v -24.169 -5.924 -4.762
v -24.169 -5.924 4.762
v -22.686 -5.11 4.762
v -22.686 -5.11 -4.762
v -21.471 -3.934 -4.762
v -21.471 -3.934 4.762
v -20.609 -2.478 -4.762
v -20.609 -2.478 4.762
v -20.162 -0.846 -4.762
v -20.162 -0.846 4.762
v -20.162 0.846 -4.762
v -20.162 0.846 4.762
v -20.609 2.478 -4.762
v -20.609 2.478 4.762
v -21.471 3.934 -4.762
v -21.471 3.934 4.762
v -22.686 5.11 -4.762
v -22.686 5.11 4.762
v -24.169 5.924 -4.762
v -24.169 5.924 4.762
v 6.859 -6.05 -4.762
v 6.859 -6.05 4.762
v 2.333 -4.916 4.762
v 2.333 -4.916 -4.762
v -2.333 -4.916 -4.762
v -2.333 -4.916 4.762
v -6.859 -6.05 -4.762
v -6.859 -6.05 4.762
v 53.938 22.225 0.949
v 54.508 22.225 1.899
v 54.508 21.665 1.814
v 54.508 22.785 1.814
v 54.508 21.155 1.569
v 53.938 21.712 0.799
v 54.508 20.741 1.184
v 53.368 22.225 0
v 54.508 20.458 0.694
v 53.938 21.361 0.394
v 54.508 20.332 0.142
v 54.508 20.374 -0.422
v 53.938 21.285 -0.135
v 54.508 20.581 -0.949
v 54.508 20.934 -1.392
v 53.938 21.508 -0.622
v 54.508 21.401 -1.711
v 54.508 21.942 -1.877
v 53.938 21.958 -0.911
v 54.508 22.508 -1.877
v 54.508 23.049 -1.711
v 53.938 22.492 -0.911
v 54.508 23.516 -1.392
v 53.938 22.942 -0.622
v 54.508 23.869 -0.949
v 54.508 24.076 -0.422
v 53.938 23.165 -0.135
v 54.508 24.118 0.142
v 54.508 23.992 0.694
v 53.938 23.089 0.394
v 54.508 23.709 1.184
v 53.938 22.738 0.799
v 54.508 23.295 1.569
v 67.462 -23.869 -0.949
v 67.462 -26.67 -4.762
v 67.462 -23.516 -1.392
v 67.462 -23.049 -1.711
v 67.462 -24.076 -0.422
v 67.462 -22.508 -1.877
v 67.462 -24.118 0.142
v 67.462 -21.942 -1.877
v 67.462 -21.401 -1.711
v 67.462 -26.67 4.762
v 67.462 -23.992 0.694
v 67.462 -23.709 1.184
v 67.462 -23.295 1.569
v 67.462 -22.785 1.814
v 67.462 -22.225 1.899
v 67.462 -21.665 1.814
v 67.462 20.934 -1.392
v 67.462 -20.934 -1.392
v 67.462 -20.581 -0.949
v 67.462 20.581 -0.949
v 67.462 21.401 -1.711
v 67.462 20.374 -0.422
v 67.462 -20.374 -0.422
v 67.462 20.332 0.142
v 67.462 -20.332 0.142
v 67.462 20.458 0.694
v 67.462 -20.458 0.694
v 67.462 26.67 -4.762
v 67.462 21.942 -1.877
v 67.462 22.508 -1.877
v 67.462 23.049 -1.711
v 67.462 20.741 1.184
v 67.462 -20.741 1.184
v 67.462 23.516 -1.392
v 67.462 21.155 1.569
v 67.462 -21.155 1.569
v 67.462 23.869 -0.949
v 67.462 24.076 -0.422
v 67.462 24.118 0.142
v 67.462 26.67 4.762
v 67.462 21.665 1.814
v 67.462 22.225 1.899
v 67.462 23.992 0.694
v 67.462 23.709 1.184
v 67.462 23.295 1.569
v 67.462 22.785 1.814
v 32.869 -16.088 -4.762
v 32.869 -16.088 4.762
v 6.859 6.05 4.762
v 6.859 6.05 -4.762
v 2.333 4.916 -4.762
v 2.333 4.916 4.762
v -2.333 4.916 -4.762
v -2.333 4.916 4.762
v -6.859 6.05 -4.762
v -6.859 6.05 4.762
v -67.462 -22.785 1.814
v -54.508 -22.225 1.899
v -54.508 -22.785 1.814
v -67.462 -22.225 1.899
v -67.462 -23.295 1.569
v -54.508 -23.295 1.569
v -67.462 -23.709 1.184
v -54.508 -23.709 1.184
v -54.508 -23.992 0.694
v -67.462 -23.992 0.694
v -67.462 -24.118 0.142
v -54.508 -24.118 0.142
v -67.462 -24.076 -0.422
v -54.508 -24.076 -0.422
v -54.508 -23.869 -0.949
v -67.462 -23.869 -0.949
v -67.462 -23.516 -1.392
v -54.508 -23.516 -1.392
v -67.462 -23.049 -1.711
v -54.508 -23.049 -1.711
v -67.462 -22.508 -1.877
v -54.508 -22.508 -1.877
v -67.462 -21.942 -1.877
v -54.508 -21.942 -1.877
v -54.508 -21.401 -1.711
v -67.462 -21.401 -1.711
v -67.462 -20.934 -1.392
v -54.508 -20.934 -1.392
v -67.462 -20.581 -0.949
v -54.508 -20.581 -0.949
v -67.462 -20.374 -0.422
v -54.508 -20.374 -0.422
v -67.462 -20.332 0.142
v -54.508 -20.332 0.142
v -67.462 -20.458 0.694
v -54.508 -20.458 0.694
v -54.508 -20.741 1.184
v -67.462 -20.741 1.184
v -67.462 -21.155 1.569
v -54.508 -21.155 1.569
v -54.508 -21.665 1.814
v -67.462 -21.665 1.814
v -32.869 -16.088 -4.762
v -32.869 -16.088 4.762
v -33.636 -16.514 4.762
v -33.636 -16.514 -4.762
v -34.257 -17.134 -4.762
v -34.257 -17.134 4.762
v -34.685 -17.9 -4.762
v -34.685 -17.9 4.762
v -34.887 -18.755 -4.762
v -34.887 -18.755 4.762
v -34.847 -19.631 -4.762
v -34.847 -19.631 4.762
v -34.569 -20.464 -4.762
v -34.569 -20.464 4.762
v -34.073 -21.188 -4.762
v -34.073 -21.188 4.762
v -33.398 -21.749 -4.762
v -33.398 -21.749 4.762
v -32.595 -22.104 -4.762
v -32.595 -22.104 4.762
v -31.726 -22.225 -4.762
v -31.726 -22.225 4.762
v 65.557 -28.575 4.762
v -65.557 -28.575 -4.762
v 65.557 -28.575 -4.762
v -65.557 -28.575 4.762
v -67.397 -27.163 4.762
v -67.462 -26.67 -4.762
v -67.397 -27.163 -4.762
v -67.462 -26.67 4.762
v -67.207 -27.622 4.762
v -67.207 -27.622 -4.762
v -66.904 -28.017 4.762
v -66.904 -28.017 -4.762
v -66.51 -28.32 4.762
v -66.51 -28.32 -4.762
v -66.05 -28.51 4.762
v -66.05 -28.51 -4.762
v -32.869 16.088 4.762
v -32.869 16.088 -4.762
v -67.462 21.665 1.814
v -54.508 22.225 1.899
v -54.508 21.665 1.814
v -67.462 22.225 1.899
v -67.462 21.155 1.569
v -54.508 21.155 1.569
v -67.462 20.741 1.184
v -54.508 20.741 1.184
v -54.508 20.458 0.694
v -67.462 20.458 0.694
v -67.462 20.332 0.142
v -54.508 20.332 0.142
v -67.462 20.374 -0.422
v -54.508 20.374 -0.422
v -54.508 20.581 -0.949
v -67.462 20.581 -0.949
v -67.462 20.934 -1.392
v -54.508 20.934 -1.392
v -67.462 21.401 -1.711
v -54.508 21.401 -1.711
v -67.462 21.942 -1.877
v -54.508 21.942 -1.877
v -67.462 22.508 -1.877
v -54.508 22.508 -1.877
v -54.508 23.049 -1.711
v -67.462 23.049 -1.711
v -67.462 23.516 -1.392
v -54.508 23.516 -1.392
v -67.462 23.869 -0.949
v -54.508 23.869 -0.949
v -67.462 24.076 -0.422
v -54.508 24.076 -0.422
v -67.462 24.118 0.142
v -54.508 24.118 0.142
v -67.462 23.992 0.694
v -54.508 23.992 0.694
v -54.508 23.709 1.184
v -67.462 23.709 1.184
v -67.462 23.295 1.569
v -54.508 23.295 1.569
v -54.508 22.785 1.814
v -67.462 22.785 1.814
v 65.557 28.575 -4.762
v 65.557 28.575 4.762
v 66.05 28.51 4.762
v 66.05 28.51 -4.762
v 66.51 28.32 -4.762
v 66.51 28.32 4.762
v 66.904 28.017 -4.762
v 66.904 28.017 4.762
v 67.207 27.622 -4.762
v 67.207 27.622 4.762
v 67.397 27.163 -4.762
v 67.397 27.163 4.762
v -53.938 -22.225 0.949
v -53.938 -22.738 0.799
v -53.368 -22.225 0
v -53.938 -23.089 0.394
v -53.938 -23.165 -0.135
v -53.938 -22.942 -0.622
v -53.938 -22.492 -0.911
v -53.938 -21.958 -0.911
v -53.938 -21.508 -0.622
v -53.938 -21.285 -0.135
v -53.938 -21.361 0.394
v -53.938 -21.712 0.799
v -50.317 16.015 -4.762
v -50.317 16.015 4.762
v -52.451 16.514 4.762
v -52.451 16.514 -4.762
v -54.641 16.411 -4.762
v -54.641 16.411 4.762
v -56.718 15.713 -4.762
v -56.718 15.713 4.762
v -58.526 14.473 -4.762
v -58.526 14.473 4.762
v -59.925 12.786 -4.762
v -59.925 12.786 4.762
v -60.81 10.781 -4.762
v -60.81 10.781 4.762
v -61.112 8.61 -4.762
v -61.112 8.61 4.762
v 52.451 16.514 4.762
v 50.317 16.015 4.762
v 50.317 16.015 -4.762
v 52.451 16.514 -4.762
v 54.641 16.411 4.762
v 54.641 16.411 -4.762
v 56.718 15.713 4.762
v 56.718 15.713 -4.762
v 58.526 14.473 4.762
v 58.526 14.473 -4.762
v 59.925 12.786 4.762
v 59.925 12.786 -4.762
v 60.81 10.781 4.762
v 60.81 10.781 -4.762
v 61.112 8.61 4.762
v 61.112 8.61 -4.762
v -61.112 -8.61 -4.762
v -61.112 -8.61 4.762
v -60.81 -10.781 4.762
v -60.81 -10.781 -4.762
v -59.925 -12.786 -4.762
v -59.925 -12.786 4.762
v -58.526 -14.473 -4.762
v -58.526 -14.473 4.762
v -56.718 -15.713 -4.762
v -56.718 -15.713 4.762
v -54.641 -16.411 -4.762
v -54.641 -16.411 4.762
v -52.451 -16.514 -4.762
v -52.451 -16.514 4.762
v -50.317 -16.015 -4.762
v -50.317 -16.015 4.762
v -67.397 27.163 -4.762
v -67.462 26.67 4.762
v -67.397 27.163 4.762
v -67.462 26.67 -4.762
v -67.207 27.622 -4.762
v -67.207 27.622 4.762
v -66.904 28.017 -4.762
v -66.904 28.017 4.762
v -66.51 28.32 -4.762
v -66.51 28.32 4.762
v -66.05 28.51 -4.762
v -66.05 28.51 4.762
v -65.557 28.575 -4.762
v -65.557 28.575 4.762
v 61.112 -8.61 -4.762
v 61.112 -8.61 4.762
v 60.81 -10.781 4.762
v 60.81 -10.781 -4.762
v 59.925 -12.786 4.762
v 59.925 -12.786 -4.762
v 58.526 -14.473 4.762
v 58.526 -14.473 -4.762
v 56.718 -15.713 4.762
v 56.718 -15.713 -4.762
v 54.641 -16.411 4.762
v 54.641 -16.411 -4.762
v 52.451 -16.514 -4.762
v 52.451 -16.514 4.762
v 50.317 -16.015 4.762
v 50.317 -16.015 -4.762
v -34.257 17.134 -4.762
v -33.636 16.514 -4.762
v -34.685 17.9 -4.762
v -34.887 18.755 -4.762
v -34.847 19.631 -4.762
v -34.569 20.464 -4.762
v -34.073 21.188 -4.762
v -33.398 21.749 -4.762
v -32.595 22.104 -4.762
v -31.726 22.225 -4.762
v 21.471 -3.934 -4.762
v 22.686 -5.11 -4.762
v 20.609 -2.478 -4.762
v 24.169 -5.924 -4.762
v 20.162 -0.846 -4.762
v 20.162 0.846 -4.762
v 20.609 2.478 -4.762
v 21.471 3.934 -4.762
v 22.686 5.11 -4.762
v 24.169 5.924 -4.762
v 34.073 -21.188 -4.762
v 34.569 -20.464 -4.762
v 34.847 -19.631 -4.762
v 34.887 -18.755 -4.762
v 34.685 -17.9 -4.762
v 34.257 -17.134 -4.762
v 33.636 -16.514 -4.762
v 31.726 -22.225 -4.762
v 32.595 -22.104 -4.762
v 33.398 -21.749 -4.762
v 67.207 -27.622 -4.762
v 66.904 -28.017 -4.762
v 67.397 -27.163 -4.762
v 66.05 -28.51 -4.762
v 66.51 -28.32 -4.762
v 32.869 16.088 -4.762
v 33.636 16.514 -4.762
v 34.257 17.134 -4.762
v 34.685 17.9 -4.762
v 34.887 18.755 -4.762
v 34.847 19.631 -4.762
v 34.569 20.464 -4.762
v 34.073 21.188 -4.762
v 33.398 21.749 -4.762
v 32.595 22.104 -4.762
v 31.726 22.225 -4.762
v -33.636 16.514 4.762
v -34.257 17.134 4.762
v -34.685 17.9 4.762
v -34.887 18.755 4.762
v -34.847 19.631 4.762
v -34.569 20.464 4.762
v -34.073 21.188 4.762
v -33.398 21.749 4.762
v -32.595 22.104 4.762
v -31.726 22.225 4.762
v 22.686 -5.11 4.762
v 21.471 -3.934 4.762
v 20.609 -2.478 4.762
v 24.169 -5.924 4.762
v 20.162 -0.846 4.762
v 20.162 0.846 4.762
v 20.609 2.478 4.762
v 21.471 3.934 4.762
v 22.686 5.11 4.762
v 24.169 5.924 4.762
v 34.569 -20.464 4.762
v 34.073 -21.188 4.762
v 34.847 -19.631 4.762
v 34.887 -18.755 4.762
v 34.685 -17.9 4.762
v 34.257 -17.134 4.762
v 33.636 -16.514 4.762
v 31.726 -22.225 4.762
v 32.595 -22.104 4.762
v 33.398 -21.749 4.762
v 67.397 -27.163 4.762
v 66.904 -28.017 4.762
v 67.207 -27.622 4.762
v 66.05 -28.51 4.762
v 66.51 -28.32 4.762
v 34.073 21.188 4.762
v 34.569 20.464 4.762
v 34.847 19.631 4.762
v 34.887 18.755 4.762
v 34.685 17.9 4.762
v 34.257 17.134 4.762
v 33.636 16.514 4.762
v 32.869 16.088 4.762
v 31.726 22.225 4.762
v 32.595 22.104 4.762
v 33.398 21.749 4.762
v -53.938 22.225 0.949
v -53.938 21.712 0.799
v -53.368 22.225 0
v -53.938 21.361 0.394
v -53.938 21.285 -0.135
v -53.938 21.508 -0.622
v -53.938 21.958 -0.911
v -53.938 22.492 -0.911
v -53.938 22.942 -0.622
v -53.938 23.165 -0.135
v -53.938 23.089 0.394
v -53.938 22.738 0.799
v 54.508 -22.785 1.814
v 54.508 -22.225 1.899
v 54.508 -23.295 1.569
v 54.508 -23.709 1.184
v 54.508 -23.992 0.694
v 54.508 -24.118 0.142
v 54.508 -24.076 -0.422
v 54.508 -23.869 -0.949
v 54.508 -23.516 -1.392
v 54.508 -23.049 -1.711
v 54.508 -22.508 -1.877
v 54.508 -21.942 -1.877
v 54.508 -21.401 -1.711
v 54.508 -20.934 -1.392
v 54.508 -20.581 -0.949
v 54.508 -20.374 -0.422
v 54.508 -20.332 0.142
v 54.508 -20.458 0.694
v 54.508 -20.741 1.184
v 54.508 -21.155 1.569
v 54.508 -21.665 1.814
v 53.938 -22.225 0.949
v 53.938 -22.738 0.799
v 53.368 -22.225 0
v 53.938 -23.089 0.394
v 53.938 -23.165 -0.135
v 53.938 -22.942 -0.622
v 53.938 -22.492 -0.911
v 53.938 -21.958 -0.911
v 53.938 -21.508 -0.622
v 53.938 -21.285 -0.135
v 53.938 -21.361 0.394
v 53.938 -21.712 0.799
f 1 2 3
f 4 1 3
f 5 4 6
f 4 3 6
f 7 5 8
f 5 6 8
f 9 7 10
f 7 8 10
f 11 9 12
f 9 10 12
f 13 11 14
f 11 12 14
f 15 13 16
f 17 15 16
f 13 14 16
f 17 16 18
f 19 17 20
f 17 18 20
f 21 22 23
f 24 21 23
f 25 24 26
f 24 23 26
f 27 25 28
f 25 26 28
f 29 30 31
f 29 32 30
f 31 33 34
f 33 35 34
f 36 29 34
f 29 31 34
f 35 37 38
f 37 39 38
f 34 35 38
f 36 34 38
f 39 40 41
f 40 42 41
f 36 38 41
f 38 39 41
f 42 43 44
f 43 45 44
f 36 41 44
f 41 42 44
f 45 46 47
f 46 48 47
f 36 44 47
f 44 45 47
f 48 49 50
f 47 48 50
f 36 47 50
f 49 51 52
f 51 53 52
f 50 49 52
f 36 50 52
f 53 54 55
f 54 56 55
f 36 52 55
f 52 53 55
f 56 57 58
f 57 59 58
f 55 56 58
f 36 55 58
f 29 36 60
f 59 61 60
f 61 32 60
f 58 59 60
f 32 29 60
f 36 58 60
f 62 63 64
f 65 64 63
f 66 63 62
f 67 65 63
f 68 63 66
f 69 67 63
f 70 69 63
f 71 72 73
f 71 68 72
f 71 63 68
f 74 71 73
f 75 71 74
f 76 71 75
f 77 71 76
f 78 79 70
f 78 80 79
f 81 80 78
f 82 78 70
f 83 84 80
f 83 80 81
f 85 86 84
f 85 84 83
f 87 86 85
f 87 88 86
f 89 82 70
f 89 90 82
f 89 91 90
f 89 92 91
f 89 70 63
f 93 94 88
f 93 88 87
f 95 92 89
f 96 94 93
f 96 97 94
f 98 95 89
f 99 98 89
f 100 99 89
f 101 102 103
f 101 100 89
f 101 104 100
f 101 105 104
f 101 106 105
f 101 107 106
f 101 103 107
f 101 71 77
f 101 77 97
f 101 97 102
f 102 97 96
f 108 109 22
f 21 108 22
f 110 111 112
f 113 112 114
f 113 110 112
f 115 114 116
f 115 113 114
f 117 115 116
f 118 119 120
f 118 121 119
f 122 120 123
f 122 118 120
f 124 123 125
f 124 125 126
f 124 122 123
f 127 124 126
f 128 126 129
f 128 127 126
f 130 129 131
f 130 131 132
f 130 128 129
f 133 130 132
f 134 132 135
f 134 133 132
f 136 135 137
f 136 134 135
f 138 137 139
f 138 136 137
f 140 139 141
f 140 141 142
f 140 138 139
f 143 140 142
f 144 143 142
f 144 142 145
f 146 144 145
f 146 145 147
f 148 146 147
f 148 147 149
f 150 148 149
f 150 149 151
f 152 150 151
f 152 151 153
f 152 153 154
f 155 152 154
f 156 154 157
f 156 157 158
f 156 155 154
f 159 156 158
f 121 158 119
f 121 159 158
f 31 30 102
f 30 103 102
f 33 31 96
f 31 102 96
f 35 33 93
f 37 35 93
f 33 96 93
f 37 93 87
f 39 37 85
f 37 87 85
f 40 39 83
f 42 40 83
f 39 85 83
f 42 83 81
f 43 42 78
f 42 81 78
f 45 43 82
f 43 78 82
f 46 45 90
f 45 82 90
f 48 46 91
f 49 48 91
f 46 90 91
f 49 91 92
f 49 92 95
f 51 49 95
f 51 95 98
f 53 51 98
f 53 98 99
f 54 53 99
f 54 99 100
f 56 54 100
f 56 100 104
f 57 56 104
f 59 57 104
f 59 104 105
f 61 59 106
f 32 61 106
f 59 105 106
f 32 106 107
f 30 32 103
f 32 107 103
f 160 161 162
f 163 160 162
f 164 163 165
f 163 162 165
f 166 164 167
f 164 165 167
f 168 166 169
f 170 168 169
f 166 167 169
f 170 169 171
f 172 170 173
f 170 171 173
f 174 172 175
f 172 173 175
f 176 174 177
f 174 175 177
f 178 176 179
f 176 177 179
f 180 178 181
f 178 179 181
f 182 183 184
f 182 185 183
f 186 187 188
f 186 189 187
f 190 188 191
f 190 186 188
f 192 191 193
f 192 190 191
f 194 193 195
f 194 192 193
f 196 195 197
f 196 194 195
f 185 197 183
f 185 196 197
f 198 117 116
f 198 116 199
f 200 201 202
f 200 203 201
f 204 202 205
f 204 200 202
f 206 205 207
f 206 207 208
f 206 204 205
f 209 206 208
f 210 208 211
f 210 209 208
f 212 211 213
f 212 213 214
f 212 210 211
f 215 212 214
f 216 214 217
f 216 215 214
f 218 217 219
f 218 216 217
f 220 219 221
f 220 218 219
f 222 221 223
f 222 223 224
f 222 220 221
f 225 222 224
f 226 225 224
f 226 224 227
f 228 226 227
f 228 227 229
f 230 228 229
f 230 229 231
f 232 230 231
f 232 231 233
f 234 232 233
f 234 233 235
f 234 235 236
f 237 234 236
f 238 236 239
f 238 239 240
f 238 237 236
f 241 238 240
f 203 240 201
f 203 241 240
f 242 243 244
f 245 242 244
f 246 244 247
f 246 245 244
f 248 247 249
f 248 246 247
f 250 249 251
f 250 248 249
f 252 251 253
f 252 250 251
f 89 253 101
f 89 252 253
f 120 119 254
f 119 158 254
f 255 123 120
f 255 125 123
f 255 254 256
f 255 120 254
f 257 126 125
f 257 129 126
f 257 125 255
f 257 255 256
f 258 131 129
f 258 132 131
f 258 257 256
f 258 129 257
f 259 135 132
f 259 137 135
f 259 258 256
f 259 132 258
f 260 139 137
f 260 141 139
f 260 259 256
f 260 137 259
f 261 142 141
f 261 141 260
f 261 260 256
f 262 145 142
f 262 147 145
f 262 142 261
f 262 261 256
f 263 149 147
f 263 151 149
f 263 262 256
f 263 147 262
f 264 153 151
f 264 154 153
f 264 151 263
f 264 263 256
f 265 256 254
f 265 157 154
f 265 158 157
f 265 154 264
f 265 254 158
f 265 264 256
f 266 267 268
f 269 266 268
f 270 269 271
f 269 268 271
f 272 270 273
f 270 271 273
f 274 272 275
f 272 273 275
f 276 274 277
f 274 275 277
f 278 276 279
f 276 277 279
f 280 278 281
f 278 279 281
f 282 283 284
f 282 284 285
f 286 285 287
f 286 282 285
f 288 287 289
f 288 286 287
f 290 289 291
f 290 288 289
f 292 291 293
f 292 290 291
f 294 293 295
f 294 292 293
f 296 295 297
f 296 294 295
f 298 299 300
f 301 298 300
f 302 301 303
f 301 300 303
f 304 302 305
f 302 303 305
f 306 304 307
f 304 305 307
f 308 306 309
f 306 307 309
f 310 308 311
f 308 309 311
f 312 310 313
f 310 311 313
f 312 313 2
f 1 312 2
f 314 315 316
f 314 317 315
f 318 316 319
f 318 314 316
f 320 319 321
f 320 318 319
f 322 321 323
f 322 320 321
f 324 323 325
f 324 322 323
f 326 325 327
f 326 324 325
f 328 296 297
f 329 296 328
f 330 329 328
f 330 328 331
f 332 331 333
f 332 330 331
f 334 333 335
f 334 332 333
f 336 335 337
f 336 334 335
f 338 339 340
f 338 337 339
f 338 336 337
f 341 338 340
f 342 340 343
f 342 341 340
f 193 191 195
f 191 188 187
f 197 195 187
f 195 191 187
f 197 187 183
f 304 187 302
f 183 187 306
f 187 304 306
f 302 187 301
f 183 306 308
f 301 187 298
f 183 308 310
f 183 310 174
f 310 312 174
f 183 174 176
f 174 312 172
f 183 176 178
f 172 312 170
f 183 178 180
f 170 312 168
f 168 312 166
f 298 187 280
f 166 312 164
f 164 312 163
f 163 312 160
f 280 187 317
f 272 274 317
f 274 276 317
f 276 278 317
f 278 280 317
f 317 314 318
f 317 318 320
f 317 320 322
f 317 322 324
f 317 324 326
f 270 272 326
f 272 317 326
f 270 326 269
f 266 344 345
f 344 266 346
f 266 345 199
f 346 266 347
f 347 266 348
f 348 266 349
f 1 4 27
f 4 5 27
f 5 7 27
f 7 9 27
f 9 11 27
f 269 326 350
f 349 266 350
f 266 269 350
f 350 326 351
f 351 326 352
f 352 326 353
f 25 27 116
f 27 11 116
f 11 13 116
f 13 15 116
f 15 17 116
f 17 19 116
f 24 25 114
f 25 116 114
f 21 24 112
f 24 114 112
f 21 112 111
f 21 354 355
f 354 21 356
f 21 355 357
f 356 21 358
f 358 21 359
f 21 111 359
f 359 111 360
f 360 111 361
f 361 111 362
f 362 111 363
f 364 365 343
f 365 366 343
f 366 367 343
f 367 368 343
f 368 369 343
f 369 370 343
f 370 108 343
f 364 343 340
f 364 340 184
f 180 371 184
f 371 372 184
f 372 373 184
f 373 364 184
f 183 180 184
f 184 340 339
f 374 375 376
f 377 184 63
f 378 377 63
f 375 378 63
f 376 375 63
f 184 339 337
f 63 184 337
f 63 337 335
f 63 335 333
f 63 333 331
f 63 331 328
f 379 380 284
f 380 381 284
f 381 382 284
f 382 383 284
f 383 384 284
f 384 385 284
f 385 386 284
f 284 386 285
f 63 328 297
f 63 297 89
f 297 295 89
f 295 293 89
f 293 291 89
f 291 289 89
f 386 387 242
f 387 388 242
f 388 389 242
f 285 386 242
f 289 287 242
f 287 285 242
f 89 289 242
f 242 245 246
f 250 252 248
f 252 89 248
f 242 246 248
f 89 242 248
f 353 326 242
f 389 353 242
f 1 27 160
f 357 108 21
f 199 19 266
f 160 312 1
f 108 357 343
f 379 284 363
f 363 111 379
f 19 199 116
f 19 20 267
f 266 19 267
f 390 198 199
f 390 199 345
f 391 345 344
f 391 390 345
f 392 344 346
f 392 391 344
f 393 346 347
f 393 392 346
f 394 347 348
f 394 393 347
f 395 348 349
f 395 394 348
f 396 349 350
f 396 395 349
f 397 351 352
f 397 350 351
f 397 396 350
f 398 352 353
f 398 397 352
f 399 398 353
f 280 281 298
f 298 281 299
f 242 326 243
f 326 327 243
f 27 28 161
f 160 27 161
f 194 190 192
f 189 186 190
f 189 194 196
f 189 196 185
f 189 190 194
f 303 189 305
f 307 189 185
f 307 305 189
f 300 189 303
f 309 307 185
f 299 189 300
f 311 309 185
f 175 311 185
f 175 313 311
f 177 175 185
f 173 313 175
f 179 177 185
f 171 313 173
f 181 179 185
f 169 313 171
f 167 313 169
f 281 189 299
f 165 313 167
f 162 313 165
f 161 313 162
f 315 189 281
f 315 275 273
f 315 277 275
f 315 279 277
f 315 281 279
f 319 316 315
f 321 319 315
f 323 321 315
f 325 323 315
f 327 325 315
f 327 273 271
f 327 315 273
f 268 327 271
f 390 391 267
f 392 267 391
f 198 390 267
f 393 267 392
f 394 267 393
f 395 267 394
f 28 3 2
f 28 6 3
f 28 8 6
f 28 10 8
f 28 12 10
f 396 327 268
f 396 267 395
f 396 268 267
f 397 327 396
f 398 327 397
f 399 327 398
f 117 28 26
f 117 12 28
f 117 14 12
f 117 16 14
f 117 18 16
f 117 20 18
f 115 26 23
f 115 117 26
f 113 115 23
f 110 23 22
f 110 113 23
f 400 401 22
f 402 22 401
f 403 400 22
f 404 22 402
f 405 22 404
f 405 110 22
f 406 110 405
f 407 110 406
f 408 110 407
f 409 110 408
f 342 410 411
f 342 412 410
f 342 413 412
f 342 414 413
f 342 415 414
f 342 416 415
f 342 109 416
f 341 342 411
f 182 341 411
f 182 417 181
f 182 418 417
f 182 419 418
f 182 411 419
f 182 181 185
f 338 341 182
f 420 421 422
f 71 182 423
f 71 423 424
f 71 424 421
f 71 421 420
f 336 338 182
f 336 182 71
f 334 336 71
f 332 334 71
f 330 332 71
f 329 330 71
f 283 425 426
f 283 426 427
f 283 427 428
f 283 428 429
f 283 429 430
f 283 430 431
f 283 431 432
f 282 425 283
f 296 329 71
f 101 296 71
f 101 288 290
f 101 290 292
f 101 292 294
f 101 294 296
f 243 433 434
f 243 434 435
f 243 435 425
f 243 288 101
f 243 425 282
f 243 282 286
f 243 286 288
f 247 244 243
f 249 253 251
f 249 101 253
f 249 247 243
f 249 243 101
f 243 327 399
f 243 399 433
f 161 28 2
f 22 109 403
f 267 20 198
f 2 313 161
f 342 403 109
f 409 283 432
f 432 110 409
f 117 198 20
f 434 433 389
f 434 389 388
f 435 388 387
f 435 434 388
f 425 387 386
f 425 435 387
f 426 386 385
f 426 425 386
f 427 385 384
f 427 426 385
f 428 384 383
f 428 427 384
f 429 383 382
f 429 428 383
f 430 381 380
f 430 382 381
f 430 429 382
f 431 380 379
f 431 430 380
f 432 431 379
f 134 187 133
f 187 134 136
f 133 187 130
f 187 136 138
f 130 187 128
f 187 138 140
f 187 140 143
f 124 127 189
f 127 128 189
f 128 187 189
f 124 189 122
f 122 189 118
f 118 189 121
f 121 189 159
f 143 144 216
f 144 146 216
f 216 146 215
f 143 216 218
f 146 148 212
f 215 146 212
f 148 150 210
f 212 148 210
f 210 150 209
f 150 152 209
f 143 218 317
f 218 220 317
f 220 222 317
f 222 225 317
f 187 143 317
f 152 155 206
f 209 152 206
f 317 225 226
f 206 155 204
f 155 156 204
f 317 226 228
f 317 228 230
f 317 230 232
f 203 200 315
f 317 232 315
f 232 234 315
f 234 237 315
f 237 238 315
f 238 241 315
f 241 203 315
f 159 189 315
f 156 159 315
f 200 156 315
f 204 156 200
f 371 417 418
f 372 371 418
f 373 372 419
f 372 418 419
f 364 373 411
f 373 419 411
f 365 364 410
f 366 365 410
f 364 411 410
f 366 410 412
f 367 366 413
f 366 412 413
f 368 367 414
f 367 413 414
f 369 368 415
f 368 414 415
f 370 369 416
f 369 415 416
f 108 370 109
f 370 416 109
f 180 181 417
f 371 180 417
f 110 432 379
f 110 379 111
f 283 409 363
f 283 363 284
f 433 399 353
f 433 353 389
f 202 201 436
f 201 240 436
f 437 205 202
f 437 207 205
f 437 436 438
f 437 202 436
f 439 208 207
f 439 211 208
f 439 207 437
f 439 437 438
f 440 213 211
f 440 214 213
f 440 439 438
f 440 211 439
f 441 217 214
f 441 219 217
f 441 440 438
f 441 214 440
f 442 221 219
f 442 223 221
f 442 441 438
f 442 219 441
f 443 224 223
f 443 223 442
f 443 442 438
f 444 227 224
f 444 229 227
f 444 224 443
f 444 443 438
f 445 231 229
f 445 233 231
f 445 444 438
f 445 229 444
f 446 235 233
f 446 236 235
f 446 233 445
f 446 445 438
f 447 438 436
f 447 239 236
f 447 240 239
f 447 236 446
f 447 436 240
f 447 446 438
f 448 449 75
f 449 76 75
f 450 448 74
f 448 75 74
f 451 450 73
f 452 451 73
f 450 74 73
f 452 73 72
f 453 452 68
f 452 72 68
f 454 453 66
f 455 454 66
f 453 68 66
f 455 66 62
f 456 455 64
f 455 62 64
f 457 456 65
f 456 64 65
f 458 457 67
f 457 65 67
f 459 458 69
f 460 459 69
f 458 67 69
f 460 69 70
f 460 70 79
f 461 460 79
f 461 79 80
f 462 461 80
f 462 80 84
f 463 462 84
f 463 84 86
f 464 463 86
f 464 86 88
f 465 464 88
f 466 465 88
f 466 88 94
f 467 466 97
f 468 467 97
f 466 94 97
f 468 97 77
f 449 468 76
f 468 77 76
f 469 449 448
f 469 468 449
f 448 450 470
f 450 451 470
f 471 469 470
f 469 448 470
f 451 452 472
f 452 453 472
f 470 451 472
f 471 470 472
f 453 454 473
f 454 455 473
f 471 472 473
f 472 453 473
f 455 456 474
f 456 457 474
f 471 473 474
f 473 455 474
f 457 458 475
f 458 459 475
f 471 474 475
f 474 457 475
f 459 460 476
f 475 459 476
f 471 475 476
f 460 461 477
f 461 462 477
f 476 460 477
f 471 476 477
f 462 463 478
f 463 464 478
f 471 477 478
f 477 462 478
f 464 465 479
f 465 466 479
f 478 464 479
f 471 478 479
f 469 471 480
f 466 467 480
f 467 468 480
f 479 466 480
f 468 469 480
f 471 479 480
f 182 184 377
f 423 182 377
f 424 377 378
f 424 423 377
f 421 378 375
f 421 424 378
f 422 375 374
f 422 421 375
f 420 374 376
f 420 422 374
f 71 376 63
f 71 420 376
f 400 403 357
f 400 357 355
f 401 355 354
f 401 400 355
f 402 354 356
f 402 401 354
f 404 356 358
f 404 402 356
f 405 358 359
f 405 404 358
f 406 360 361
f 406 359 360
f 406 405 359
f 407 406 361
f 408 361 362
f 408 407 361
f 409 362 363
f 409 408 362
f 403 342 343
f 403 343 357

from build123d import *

# Parameters (mm, degrees)
SKETCH1_W                       = 134.9248
SKETCH1_H                       = 57.15
BOSS_EXTRUDE1_DEPTH             = 4.7625
CUT_EXTRUDE1_DEPTH              = 10.525
F_10_24_TAPPED_HOLE1_AT_2_COUNT = 2
F_10_24_TAPPED_HOLE1_AT_2_PITCH = 44.45
FILLET1_R                       = 1.905


with BuildPart() as part:
    # Sketch1 → Boss-Extrude1 (new body, symmetric)
    with BuildSketch(Plane.XY):
        Rectangle(SKETCH1_W, SKETCH1_H)
    extrude(amount=BOSS_EXTRUDE1_DEPTH, both=True)

    # Sketch3 → Cut-Extrude1 (cut, through all)
    with BuildSketch(Plane.XY.offset(4.7625)):
        with BuildLine():
            Line((-61.1124, 8.609886798), (-61.1124, -8.609886798))
            ThreePointArc((-61.1124, -8.609886798), (-57.664894583, -15.155408542), (-50.317097979, -16.015079156))
            Line((-50.317097979, -16.015079156), (-24.169295524, -5.924153886))
            ThreePointArc((-24.169295524, -5.924153886), (-20.105537141, 0), (-24.169295524, 5.924153886))
            Line((-24.169295524, 5.924153886), (-50.317097979, 16.015079156))
            ThreePointArc((-50.317097979, 16.015079156), (-57.664894583, 15.155408542), (-61.1124, 8.609886798))
        make_face()
        with BuildLine():
            Line((-31.725706947, -22.225), (31.725706947, -22.225))
            ThreePointArc((31.725706947, -22.225), (34.847022318, -19.631390878), (32.868827755, -16.087923057))
            Line((32.868827755, -16.087923057), (6.85872485, -6.050138615))
            ThreePointArc((6.85872485, -6.050138615), (0, -4.772600274), (-6.85872485, -6.050138615))
            Line((-6.85872485, -6.050138615), (-32.868827755, -16.087923057))
            ThreePointArc((-32.868827755, -16.087923057), (-34.847022318, -19.631390878), (-31.725706947, -22.225))
        make_face()
        with BuildLine():
            Line((-31.725706947, 22.225), (31.725706947, 22.225))
            ThreePointArc((31.725706947, 22.225), (34.847022318, 19.631390878), (32.868827755, 16.087923057))
            Line((32.868827755, 16.087923057), (6.85872485, 6.050138615))
            ThreePointArc((6.85872485, 6.050138615), (0, 4.772600274), (-6.85872485, 6.050138615))
            Line((-6.85872485, 6.050138615), (-32.868827755, 16.087923057))
            ThreePointArc((-32.868827755, 16.087923057), (-34.847022318, 19.631390878), (-31.725706947, 22.225))
        make_face()
        with BuildLine():
            Line((61.1124, 8.609886798), (61.1124, -8.609886798))
            ThreePointArc((61.1124, -8.609886798), (57.664894583, -15.155408542), (50.317097979, -16.015079156))
            Line((50.317097979, -16.015079156), (24.169295524, -5.924153886))
            ThreePointArc((24.169295524, -5.924153886), (20.105537141, 0), (24.169295524, 5.924153886))
            Line((24.169295524, 5.924153886), (50.317097979, 16.015079156))
            ThreePointArc((50.317097979, 16.015079156), (57.664894583, 15.155408542), (61.1124, 8.609886798))
        make_face()
    extrude(amount=-CUT_EXTRUDE1_DEPTH, mode=Mode.SUBTRACT)

    # Sketch4 → #10-24 Tapped Hole1 (revolve, cut)
    with BuildSketch(Plane(origin=(-67.4624, 22.225, 0), x_dir=(0, 0, 1), z_dir=(0, 1, 0))):
        Polygon((0, 0), (0, 14.094824014), (1.89865, 12.954), (1.89865, 0), align=None)
    f_10_24_tapped_hole1 = revolve(axis=Axis((-73.8124, 22.225, 0), (1, 0, 0)), mode=Mode.SUBTRACT)

    # #10-24 Tapped Hole1 at 2: #10-24 Tapped Hole1 ×2
    with Locations(*[(0, -i * F_10_24_TAPPED_HOLE1_AT_2_PITCH, 0) for i in range(1, F_10_24_TAPPED_HOLE1_AT_2_COUNT)]):
        add(f_10_24_tapped_hole1, mode=Mode.SUBTRACT)

    # Mirror1: #10-24 Tapped Hole1 across plane
    add(f_10_24_tapped_hole1.mirror(Plane(origin=(0, 0, 0), x_dir=(0, 0, 1), z_dir=(1, 0, 0))), mode=Mode.SUBTRACT)

    # Mirror1 copy 1 sketch → Mirror1 copy 1 (revolve, cut)
    with BuildSketch(Plane(origin=(67.4624, -22.225, 0), x_dir=(0, 0, 1), z_dir=(0, 1, 0))):
        Polygon((0, 0), (0, -14.094824014), (1.89865, -12.954), (1.89865, 0), align=None)
    revolve(axis=Axis((73.8124, -22.225, 0), (1, 0, 0)), mode=Mode.SUBTRACT)

    # Fillet1
    fillet1_edges = [part.edges().sort_by_distance(p)[0] for p in [
        (67.4624, -28.575, 0),
        (-67.4624, -28.575, 0),
        (-67.4624, 28.575, 0),
        (67.4624, 28.575, 0),
    ]]
    fillet(fillet1_edges, radius=FILLET1_R)


solid = part.part
